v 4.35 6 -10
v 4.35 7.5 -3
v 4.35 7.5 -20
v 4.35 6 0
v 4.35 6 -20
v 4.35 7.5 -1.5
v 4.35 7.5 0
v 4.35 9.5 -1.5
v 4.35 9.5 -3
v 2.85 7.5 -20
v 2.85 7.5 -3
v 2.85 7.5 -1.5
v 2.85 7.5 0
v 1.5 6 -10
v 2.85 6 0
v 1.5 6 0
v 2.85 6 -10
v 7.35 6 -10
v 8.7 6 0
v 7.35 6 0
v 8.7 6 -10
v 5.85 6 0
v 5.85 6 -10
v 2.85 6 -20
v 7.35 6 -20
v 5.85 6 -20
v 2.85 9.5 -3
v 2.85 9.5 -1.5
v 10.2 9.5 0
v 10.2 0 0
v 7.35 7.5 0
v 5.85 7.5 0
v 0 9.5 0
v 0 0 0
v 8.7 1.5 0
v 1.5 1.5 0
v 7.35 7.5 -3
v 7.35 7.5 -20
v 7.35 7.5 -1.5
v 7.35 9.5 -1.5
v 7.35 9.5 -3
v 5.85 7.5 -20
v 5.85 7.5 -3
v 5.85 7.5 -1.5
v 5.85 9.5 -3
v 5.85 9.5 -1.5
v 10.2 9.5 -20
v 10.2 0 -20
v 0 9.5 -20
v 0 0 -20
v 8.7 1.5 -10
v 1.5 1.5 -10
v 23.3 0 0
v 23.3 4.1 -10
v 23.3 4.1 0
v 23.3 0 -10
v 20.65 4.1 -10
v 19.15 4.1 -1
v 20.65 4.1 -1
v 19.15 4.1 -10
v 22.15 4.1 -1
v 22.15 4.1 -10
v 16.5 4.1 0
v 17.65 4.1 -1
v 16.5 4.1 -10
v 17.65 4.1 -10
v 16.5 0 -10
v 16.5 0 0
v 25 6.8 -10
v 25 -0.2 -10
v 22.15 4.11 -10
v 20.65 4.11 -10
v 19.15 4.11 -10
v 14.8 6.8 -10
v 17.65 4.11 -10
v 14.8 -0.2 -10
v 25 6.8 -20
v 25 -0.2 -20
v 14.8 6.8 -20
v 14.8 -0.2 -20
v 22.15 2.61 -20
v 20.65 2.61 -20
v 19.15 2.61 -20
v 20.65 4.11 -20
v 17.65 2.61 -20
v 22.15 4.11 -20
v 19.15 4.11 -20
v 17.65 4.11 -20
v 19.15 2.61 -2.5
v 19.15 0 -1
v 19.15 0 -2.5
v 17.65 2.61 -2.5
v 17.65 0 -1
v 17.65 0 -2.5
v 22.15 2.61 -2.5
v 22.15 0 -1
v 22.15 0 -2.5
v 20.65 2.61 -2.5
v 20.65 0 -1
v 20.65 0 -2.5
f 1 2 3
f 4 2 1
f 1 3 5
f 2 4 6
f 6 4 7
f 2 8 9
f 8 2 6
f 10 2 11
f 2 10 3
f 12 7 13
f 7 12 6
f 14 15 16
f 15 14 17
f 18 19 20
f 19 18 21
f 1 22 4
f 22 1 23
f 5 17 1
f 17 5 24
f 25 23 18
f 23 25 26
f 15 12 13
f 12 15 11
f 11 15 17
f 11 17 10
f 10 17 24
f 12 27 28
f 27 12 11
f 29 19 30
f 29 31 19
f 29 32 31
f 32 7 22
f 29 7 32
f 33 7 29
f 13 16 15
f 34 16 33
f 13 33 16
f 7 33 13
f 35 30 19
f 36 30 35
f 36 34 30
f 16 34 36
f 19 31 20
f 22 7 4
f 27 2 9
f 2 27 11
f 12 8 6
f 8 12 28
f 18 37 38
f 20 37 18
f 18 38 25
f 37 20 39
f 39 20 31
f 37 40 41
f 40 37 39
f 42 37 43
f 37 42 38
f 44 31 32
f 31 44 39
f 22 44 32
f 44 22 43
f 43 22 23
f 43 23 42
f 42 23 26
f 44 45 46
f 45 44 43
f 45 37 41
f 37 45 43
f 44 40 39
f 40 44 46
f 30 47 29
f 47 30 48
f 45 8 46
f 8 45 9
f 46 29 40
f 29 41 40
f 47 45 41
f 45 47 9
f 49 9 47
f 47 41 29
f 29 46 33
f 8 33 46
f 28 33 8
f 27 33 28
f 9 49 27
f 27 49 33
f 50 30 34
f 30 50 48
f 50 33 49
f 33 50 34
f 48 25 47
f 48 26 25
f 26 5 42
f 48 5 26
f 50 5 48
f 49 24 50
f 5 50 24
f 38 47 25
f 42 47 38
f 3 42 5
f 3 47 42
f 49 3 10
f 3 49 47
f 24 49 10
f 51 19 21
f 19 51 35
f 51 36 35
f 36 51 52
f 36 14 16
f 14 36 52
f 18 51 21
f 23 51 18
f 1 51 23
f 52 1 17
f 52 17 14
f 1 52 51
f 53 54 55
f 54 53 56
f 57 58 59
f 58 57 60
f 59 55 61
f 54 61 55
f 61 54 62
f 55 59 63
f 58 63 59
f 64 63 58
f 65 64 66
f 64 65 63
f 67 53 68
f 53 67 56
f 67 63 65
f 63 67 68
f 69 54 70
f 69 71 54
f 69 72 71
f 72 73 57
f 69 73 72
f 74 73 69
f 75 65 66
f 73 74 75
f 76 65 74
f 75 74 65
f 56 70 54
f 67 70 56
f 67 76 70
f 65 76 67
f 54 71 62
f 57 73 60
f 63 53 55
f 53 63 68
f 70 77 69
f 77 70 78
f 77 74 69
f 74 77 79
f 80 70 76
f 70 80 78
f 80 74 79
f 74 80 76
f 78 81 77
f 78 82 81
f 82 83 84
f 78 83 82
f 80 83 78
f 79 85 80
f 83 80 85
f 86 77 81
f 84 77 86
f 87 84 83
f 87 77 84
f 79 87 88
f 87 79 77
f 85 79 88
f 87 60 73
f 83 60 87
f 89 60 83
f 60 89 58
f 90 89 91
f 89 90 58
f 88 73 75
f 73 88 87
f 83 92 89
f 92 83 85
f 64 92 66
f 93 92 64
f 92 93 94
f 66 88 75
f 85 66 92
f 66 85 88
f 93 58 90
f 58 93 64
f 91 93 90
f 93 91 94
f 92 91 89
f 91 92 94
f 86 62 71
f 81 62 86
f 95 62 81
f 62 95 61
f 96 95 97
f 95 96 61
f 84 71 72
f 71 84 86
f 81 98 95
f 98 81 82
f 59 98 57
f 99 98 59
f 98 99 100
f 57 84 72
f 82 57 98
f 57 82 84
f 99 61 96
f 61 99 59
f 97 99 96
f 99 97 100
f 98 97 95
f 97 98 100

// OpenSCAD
// Male and female sockets for Ikea LEDBERG LED strips.  These are designed to
// be filled with 22 gauge solid core wire (or similar).  Multi-filament wire
// also works if you twist it. It'll work even better if you tin it. All units
// are in mm.

// Size of male connector. This is the base connector size.
male_x=7;
male_y=10;
male_z=4.3;

// thickness of the outer wall.
wall_thickness=1.5;

// size of female housing.
female_y=20;

// extra height above connector for electronics
female_z_extra=2;
male_z_extra=1;

// The amount of minor offset to make differences work correctly.
diff_offset=.01;

// contact channel width
contact_channel_x=1.5;
contact_channel_y=40;
contact_channel_z=1.5;

// how much of a lip to give the contact channel at the end of the socket
contact_channel_recess_male=1;
// No lip on the female, as it could potentially make the bar get stuck.
contact_channel_recess_female=0;

// The distance between the centers of the two contacts.
contact_channel_separation=3;

// How much extra to add to account for extrusion inaccuracies. This makes the male smaller and the female larger. 0.1 works well on a Lulzbot 0.5mm nozzle, 3mm filament.
extrusion_offset=0.1;

male_contact_z=male_z-contact_channel_z-wall_thickness+diff_offset-extrusion_offset*2;

module contact_channel(x,y,z,recess,end_lock_z,end_lock_z_offset,end_lock_y_offset){
        // one contact left
        translate([(wall_thickness + x/2)-contact_channel_separation/2-contact_channel_x/2,recess,z+wall_thickness]){
            cube([contact_channel_x,contact_channel_y,contact_channel_z]);
	    translate([0,end_lock_y_offset,end_lock_z_offset-wall_thickness]){
		cube([contact_channel_x,contact_channel_x,end_lock_z]);
	    }
        }
        // right contact
        translate([(wall_thickness + x/2)+contact_channel_separation/2-contact_channel_x/2,recess,z+wall_thickness]){
            cube([contact_channel_x,contact_channel_y,contact_channel_z]);
	    translate([0,end_lock_y_offset,end_lock_z_offset-wall_thickness]){
		cube([contact_channel_x,contact_channel_x,end_lock_z]);
	    }
        }
}

module female() {
    difference() {
	// Outer casing
        cube([male_x+wall_thickness*2+extrusion_offset*2,
                female_y,
                male_z+wall_thickness*2 + female_z_extra+extrusion_offset*2]);

	// Socket hole
        translate([wall_thickness,-diff_offset,wall_thickness]){
            cube([male_x + extrusion_offset*2,male_y+diff_offset,male_z + extrusion_offset*2]);
        }
	contact_channel(male_x +extrusion_offset*2,male_y,male_z+ extrusion_offset*2,contact_channel_recess_female,male_z + wall_thickness*2+female_z_extra+extrusion_offset*2,0,wall_thickness);
    }
}

module male(){
    difference(){
        union(){
            translate([wall_thickness,0,0]){
                cube([male_x - extrusion_offset*2, male_y, male_z - extrusion_offset*2]);
            }
            translate([-extrusion_offset*2,male_y,-extrusion_offset*2]){
                cube([male_x+wall_thickness*2 + extrusion_offset*2, male_y, male_z+wall_thickness+male_z_extra+extrusion_offset*2]);
            }
        }
    contact_channel(male_x-extrusion_offset*2,male_y, male_contact_z, contact_channel_recess_male, male_z, -male_contact_z,0);
    }
}

rotation=-90;

// Rotating them -90 degrees made the prints come out the best.
rotate([rotation,0,0]){
    female();
}

translate([15,0,0]){
    rotate([rotation,0,0]){
	male();
    }
}
